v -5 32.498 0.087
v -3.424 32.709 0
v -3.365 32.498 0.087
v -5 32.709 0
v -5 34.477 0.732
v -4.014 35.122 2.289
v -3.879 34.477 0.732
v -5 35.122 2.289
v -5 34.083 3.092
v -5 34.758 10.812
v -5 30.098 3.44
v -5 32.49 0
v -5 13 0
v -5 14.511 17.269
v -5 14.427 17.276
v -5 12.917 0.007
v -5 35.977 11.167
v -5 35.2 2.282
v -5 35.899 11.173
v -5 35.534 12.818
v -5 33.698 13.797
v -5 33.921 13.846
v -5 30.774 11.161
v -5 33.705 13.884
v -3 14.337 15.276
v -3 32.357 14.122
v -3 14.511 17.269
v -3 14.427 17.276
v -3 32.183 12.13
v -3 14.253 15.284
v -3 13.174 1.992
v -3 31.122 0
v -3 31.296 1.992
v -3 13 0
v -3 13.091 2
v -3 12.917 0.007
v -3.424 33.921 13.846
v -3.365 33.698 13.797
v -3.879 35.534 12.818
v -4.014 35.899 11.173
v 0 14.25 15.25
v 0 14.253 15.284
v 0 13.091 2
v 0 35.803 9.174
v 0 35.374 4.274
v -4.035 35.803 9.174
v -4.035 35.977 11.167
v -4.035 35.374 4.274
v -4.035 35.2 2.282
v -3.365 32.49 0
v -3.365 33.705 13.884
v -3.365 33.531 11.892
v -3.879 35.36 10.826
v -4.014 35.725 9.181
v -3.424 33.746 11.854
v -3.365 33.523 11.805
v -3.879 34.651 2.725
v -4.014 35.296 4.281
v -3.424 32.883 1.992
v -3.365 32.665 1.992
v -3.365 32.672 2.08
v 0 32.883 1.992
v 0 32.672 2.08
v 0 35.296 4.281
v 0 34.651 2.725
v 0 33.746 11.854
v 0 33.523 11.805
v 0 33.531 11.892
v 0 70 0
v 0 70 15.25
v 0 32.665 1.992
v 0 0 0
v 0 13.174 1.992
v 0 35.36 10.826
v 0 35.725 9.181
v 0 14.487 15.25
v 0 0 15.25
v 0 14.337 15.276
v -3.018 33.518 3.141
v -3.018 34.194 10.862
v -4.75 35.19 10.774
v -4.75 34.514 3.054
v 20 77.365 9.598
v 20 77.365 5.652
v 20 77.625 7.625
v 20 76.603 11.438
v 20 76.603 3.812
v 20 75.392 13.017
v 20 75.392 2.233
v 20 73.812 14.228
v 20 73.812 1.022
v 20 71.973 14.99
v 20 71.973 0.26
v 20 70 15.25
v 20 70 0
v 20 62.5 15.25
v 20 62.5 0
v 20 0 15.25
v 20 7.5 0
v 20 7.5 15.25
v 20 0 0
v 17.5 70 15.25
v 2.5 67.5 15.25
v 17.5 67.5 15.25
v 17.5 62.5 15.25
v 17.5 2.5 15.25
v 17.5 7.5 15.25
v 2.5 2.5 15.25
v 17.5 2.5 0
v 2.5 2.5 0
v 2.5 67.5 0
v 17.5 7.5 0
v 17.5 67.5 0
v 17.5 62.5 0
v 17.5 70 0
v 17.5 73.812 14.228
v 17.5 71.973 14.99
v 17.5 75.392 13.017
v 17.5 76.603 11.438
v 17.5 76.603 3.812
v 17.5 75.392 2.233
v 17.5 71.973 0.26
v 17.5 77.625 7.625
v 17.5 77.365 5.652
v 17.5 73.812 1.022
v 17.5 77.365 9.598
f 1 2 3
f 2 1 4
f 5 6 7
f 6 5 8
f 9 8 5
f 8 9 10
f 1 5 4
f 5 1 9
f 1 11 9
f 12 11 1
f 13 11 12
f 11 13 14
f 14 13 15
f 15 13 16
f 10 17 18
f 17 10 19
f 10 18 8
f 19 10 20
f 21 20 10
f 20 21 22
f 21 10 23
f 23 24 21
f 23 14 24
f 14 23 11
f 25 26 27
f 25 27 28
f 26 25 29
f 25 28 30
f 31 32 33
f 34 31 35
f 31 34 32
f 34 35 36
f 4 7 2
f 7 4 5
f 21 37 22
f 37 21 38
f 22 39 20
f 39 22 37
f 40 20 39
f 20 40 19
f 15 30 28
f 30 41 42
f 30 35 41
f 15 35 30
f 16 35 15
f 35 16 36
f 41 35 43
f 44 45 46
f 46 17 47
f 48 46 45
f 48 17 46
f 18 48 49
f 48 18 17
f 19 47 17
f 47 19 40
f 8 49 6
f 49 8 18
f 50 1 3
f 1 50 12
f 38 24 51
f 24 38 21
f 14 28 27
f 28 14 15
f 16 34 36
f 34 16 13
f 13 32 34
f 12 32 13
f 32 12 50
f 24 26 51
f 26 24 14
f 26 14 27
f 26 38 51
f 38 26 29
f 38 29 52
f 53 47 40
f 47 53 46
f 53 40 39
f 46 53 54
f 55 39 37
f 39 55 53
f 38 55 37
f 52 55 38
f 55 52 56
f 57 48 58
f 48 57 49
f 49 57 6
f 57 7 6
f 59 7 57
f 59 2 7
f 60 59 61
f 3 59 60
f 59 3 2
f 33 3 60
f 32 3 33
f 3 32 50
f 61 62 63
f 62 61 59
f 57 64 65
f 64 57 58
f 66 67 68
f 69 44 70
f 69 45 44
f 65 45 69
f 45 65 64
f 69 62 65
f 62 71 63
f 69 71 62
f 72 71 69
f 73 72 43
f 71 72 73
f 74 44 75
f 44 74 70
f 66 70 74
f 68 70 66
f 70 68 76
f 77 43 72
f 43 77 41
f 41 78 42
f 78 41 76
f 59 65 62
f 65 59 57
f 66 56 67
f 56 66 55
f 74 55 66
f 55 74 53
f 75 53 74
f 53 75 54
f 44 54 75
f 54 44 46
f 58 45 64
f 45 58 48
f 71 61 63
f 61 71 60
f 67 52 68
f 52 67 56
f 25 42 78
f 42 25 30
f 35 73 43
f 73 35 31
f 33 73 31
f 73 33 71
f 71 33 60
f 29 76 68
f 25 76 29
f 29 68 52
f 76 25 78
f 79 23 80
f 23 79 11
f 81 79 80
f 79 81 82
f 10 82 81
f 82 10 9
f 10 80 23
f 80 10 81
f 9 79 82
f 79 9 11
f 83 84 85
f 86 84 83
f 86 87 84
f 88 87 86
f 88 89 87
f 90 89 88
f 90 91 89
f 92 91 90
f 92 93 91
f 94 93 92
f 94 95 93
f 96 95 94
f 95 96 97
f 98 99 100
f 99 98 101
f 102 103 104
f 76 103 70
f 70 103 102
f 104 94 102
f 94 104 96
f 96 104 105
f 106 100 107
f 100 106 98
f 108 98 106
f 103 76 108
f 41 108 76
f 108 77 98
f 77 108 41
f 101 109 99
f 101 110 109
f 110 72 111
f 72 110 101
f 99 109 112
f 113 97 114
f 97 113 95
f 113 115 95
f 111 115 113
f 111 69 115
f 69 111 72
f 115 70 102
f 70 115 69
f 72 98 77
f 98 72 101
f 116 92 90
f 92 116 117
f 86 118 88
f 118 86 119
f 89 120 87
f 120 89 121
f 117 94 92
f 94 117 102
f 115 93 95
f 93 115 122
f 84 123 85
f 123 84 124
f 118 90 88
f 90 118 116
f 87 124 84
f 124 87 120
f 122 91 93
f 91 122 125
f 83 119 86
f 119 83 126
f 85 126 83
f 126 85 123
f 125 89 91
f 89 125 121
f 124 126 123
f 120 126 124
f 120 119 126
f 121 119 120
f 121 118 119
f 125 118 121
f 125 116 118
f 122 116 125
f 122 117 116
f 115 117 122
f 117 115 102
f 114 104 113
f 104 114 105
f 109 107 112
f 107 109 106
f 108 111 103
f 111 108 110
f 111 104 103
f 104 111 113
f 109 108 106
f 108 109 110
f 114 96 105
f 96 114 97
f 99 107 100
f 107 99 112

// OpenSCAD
//width of camera / phone in mm
camerawidth=65;

//height of camera / phone in mm
cameraheight=15;

//thickness of gripper
gripperthickness=2.5;

//height of gripper
gripperheight=15.25;

//overhang of gripper
gripperoverhang=5;

//offset of the insert in mm
insertloc = 35;

translate([-3,insertloc,0]) rotate([0,-90,0])rotate([0,0,275]) insert();
difference()
{	union(){
cube([cameraheight+2*gripperthickness,camerawidth+2*gripperthickness,gripperheight]);
	translate([cameraheight+gripperthickness,camerawidth+2*gripperthickness,gripperheight/2])rotate([0,90,0])cylinder(r=gripperheight/2, h=gripperthickness);
}
	translate([gripperthickness,gripperthickness,0])cube([ cameraheight,camerawidth,gripperheight]);
	translate([gripperthickness+cameraheight,gripperthickness+gripperoverhang,0])cube([ gripperthickness,camerawidth-2*gripperoverhang,gripperheight]);
}




/*********************************************************
 Everything after this point is just to draw the  gorillapod insert
 *********************************************************/
module insert(standOffHeight=3)
{
	insertAngle =5;
	insertLength=22;
	baseThick=2;
	difference()
	{
		union(){
		difference(){
			roundedTrapezoid(thick=baseThick, angle=insertAngle, r1=0, r2=2.5, baseW=13.5, length=insertLength);
			rotate([0,15,0])translate([-0.5,-2,-6])cube([15,17.5,7]);
		}
		translate([0,2,-1*standOffHeight])
			roundedTrapezoid(thick=standOffHeight+2, angle=insertAngle, r1=0, r2=2.5, baseW=9.5, length=insertLength);
		}
		translate([0.75,3,1.75])rotate([0,60,0])cube([2,7.75,4]);
	}
}


/*********************************************************
Rounded Trapezoid modules were stolen directly from the Pocket Coin-Op
 *********************************************************/
module roundedTrapezoid(thick=5, length=19.5, r1=2, r2=9.5, angle=13.5, baseW=23) 
{
x1 = length*sin(angle);
difference()
{
trapezoidSolid(thick = thick, length = length, r1=r1, r2=r2, angle = angle, baseW=baseW);
translate([length,-1*x1,0])cube([2*r2-length,baseW+2*x1,thick]);
rotate([0,0,-1*angle])translate([0,-1*(r1+r2+5),0])cube([length,r1+r2+5, thick]);
translate([0,baseW,0]) rotate([0,0,angle])cube([ length,r1+r2+5, thick]);
}
}


module trapezoidSolid(thick=5, length=19.5, r1=1, r2=9.5, angle=13.5, baseW=23)
{
r1oSet = length/cos(angle)-r1*tan((90+angle)/2);// -r1-r1*tan(angle);//-r1/cos(angle);
sideoSet = r2*tan((90-angle)/2);// r2*(1- tan(angle));
sidelen = r1oSet-sideoSet;
bottomoSet = (length*sin(angle))-r1*tan((90+angle)/2);

rotate([0,0,-1*angle])
{
translate([r1oSet,r1,0])cylinder(h=thick, r=r1);
translate([sideoSet,r2,0])cylinder(h=thick,r=r2);
translate([sideoSet,0,0]) cube([sidelen,2*r1,thick]);
}
translate([0,baseW,0])rotate([0,0,angle])
{
translate([0,-2*r1,0])
{
translate([r1oSet,r1,0])cylinder(h=thick, r=r1);
translate([sideoSet,-r2+2*r1,0])cylinder(h=thick,r=r2);
translate([sideoSet,0,0]) cube([sidelen,2*r1,thick]);
}
}
translate([0,sideoSet,0])cube([length,baseW-2*sideoSet,thick]);
translate([r2,-bottomoSet,0])cube([length-r2,baseW+2*bottomoSet,thick]);
}
